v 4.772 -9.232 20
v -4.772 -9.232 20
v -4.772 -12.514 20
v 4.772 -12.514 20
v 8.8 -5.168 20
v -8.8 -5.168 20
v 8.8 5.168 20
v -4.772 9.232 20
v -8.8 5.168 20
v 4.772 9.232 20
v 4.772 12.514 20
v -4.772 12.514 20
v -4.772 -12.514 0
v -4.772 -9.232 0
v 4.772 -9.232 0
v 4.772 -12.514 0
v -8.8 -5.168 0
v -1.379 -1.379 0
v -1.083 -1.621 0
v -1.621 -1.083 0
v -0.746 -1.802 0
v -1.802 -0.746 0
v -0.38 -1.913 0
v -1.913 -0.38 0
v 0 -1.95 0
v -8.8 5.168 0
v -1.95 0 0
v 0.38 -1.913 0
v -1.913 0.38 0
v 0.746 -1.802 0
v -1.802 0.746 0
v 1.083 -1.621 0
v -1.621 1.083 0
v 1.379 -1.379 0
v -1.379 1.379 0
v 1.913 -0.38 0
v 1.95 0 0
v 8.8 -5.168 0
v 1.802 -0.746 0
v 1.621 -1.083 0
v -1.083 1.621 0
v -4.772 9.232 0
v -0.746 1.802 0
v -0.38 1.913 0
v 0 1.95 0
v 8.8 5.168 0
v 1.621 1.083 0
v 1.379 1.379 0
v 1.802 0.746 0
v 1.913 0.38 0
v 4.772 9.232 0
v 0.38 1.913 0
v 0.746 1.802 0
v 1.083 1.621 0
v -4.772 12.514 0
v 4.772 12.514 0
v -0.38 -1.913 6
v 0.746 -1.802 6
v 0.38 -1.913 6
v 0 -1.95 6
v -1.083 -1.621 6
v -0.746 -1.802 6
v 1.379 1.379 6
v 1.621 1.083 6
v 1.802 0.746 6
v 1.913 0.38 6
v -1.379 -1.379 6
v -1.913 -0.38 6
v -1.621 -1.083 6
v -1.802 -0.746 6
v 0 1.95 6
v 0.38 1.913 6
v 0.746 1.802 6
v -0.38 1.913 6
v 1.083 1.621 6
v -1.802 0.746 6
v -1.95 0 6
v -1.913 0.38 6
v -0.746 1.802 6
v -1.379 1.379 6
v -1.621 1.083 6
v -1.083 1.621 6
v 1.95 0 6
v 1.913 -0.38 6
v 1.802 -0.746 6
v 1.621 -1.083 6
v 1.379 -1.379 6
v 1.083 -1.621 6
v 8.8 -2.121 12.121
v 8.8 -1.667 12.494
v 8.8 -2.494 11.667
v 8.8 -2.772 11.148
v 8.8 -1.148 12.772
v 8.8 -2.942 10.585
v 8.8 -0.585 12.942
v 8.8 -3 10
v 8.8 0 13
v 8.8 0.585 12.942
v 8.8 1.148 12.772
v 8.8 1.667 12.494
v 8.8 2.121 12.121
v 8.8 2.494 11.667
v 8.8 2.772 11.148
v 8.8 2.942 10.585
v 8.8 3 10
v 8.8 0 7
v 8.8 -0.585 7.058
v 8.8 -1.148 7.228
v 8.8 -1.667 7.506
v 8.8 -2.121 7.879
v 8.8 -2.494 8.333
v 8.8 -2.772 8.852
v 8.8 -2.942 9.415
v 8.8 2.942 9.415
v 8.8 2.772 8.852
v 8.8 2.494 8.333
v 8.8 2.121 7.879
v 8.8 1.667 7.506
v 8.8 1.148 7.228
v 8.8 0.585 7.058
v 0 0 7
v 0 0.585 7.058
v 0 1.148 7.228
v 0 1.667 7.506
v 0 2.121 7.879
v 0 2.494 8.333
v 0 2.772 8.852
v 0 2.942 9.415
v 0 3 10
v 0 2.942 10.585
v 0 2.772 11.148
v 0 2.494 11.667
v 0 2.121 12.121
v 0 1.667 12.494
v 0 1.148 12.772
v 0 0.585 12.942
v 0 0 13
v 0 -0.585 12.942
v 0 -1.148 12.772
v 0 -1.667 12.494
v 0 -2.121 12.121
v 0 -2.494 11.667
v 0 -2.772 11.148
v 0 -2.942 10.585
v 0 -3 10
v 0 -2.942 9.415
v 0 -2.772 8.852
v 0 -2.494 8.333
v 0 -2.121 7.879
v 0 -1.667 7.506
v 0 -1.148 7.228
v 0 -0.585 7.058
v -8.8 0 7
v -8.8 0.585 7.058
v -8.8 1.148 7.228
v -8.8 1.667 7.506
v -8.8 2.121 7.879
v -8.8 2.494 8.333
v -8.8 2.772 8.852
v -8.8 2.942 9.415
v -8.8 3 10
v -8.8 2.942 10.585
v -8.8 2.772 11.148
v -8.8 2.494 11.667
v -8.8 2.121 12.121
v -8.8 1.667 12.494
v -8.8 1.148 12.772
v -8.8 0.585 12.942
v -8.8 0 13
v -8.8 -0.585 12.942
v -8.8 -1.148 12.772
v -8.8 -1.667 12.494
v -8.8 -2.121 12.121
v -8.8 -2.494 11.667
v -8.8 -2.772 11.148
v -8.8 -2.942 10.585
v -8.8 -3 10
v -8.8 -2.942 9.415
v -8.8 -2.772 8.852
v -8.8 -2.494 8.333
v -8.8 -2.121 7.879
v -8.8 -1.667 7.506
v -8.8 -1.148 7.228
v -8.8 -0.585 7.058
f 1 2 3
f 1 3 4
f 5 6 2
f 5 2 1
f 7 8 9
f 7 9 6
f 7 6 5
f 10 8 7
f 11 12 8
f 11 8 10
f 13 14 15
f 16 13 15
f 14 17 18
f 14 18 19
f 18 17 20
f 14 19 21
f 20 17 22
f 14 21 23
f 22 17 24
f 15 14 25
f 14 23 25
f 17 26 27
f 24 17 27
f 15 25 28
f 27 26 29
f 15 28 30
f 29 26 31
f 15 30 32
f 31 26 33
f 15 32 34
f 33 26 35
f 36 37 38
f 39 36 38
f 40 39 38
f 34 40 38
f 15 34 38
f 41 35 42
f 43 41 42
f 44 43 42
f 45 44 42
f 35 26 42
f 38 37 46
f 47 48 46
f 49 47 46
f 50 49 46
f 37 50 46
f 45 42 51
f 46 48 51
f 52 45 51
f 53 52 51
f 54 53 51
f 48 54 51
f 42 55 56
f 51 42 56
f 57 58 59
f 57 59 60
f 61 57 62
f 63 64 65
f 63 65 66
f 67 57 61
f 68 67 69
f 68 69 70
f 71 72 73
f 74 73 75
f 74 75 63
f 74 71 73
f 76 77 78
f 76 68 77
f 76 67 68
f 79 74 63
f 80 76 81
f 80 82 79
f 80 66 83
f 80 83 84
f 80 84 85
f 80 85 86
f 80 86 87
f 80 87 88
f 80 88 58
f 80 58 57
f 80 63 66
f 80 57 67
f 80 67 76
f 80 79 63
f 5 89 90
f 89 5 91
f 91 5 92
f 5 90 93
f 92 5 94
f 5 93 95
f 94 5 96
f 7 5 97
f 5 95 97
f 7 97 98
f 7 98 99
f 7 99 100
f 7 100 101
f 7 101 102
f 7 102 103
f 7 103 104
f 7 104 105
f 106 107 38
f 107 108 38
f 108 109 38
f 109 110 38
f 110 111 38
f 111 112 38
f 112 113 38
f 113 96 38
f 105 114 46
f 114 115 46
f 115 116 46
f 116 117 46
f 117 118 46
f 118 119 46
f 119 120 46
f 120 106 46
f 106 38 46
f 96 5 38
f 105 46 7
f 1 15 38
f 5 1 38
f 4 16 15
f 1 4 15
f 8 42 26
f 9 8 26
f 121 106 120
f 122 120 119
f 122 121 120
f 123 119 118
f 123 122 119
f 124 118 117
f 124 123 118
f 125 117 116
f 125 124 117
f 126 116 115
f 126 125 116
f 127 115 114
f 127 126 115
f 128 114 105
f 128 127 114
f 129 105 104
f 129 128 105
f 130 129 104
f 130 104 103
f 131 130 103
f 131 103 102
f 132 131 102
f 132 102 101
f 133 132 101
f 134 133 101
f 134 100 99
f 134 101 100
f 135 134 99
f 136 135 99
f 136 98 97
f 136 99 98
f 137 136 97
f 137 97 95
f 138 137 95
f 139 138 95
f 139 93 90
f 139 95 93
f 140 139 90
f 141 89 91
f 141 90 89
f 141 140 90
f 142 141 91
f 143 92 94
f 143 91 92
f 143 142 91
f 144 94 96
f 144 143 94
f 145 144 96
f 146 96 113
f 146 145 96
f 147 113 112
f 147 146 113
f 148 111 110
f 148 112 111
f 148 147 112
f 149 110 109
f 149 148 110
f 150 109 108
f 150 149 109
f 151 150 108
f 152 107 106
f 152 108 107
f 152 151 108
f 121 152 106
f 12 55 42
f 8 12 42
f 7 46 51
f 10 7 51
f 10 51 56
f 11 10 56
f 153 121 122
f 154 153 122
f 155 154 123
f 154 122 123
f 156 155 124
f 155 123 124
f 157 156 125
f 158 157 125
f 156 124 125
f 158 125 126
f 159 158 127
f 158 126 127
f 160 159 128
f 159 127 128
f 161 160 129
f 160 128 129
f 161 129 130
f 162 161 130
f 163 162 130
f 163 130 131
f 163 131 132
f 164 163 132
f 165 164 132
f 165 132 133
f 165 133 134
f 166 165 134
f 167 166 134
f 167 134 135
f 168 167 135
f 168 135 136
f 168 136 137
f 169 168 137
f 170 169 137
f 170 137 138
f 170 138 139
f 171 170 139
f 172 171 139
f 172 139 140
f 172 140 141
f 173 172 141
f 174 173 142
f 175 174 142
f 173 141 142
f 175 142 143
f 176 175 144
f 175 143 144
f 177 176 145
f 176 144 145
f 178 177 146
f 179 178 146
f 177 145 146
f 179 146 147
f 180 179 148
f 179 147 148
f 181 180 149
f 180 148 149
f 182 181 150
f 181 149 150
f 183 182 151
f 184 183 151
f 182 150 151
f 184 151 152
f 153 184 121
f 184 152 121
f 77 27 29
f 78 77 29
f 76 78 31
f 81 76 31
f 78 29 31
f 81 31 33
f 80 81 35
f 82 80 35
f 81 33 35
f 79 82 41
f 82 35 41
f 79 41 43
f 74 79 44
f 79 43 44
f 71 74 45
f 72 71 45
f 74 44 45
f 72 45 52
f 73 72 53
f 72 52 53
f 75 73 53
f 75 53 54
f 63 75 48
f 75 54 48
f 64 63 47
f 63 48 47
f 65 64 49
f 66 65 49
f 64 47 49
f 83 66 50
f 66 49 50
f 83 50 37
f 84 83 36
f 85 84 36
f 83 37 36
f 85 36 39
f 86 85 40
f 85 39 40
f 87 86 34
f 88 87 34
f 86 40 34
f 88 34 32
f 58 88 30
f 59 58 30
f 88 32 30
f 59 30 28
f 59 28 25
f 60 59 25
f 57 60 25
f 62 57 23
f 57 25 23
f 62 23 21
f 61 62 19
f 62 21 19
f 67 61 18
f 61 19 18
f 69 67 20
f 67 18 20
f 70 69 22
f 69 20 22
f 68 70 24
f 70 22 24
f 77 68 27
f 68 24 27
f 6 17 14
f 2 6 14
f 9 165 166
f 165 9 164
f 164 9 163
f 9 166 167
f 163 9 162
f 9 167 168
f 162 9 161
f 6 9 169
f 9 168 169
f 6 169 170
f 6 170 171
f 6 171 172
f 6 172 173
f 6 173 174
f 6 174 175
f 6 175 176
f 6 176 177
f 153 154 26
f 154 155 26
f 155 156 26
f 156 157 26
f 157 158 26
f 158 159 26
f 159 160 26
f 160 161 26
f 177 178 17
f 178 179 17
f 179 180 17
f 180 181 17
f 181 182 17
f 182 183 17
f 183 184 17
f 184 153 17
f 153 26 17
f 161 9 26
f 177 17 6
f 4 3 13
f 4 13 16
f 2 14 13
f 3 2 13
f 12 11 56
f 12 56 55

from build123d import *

# Parameters (mm, degrees)
BOSS_EXTRUDE1_DEPTH     = 20
SKETCH2_R               = 3
CUT_EXTRUDE1_DEPTH      = 20
CUT_EXTRUDE1_DEPTH_BACK = 20
SKETCH3_R               = 1.95
CUT_EXTRUDE2_DEPTH      = 6


with BuildPart() as part:
    # Sketch1 → Boss-Extrude1 (new body)
    with BuildSketch(Plane.XY):
        Polygon((4.772, -12.514), (4.772, -9.231678019), (8.8, -5.167678019), (8.8, 0), (8.8, 5.167678019), (4.772, 9.231678019), (4.772, 12.514), (-4.772, 12.514), (-4.772, 9.231678019), (-8.8, 5.167678019), (-8.8, 0), (-8.8, -5.167678019), (-4.772, -9.231678019), (-4.772, -12.514), align=None)
    extrude(amount=BOSS_EXTRUDE1_DEPTH)

    # Sketch2 → Cut-Extrude1 (cut, two sides)
    with BuildSketch(Plane(origin=(0, 0, 0), x_dir=(0, 0, -1), z_dir=(1, 0, 0))) as cut_extrude1_sk:
        with Locations((-10, 0)):
            Circle(SKETCH2_R)
    extrude(amount=CUT_EXTRUDE1_DEPTH, mode=Mode.SUBTRACT)
    extrude(cut_extrude1_sk.sketch, amount=-CUT_EXTRUDE1_DEPTH_BACK, mode=Mode.SUBTRACT)

    # Sketch3 → Cut-Extrude2 (cut)
    with BuildSketch(Plane(origin=(0, 0, 0), x_dir=(-1, 0, 0), z_dir=(0, 0, -1))):
        Circle(SKETCH3_R)
    extrude(amount=-CUT_EXTRUDE2_DEPTH, mode=Mode.SUBTRACT)


solid = part.part
